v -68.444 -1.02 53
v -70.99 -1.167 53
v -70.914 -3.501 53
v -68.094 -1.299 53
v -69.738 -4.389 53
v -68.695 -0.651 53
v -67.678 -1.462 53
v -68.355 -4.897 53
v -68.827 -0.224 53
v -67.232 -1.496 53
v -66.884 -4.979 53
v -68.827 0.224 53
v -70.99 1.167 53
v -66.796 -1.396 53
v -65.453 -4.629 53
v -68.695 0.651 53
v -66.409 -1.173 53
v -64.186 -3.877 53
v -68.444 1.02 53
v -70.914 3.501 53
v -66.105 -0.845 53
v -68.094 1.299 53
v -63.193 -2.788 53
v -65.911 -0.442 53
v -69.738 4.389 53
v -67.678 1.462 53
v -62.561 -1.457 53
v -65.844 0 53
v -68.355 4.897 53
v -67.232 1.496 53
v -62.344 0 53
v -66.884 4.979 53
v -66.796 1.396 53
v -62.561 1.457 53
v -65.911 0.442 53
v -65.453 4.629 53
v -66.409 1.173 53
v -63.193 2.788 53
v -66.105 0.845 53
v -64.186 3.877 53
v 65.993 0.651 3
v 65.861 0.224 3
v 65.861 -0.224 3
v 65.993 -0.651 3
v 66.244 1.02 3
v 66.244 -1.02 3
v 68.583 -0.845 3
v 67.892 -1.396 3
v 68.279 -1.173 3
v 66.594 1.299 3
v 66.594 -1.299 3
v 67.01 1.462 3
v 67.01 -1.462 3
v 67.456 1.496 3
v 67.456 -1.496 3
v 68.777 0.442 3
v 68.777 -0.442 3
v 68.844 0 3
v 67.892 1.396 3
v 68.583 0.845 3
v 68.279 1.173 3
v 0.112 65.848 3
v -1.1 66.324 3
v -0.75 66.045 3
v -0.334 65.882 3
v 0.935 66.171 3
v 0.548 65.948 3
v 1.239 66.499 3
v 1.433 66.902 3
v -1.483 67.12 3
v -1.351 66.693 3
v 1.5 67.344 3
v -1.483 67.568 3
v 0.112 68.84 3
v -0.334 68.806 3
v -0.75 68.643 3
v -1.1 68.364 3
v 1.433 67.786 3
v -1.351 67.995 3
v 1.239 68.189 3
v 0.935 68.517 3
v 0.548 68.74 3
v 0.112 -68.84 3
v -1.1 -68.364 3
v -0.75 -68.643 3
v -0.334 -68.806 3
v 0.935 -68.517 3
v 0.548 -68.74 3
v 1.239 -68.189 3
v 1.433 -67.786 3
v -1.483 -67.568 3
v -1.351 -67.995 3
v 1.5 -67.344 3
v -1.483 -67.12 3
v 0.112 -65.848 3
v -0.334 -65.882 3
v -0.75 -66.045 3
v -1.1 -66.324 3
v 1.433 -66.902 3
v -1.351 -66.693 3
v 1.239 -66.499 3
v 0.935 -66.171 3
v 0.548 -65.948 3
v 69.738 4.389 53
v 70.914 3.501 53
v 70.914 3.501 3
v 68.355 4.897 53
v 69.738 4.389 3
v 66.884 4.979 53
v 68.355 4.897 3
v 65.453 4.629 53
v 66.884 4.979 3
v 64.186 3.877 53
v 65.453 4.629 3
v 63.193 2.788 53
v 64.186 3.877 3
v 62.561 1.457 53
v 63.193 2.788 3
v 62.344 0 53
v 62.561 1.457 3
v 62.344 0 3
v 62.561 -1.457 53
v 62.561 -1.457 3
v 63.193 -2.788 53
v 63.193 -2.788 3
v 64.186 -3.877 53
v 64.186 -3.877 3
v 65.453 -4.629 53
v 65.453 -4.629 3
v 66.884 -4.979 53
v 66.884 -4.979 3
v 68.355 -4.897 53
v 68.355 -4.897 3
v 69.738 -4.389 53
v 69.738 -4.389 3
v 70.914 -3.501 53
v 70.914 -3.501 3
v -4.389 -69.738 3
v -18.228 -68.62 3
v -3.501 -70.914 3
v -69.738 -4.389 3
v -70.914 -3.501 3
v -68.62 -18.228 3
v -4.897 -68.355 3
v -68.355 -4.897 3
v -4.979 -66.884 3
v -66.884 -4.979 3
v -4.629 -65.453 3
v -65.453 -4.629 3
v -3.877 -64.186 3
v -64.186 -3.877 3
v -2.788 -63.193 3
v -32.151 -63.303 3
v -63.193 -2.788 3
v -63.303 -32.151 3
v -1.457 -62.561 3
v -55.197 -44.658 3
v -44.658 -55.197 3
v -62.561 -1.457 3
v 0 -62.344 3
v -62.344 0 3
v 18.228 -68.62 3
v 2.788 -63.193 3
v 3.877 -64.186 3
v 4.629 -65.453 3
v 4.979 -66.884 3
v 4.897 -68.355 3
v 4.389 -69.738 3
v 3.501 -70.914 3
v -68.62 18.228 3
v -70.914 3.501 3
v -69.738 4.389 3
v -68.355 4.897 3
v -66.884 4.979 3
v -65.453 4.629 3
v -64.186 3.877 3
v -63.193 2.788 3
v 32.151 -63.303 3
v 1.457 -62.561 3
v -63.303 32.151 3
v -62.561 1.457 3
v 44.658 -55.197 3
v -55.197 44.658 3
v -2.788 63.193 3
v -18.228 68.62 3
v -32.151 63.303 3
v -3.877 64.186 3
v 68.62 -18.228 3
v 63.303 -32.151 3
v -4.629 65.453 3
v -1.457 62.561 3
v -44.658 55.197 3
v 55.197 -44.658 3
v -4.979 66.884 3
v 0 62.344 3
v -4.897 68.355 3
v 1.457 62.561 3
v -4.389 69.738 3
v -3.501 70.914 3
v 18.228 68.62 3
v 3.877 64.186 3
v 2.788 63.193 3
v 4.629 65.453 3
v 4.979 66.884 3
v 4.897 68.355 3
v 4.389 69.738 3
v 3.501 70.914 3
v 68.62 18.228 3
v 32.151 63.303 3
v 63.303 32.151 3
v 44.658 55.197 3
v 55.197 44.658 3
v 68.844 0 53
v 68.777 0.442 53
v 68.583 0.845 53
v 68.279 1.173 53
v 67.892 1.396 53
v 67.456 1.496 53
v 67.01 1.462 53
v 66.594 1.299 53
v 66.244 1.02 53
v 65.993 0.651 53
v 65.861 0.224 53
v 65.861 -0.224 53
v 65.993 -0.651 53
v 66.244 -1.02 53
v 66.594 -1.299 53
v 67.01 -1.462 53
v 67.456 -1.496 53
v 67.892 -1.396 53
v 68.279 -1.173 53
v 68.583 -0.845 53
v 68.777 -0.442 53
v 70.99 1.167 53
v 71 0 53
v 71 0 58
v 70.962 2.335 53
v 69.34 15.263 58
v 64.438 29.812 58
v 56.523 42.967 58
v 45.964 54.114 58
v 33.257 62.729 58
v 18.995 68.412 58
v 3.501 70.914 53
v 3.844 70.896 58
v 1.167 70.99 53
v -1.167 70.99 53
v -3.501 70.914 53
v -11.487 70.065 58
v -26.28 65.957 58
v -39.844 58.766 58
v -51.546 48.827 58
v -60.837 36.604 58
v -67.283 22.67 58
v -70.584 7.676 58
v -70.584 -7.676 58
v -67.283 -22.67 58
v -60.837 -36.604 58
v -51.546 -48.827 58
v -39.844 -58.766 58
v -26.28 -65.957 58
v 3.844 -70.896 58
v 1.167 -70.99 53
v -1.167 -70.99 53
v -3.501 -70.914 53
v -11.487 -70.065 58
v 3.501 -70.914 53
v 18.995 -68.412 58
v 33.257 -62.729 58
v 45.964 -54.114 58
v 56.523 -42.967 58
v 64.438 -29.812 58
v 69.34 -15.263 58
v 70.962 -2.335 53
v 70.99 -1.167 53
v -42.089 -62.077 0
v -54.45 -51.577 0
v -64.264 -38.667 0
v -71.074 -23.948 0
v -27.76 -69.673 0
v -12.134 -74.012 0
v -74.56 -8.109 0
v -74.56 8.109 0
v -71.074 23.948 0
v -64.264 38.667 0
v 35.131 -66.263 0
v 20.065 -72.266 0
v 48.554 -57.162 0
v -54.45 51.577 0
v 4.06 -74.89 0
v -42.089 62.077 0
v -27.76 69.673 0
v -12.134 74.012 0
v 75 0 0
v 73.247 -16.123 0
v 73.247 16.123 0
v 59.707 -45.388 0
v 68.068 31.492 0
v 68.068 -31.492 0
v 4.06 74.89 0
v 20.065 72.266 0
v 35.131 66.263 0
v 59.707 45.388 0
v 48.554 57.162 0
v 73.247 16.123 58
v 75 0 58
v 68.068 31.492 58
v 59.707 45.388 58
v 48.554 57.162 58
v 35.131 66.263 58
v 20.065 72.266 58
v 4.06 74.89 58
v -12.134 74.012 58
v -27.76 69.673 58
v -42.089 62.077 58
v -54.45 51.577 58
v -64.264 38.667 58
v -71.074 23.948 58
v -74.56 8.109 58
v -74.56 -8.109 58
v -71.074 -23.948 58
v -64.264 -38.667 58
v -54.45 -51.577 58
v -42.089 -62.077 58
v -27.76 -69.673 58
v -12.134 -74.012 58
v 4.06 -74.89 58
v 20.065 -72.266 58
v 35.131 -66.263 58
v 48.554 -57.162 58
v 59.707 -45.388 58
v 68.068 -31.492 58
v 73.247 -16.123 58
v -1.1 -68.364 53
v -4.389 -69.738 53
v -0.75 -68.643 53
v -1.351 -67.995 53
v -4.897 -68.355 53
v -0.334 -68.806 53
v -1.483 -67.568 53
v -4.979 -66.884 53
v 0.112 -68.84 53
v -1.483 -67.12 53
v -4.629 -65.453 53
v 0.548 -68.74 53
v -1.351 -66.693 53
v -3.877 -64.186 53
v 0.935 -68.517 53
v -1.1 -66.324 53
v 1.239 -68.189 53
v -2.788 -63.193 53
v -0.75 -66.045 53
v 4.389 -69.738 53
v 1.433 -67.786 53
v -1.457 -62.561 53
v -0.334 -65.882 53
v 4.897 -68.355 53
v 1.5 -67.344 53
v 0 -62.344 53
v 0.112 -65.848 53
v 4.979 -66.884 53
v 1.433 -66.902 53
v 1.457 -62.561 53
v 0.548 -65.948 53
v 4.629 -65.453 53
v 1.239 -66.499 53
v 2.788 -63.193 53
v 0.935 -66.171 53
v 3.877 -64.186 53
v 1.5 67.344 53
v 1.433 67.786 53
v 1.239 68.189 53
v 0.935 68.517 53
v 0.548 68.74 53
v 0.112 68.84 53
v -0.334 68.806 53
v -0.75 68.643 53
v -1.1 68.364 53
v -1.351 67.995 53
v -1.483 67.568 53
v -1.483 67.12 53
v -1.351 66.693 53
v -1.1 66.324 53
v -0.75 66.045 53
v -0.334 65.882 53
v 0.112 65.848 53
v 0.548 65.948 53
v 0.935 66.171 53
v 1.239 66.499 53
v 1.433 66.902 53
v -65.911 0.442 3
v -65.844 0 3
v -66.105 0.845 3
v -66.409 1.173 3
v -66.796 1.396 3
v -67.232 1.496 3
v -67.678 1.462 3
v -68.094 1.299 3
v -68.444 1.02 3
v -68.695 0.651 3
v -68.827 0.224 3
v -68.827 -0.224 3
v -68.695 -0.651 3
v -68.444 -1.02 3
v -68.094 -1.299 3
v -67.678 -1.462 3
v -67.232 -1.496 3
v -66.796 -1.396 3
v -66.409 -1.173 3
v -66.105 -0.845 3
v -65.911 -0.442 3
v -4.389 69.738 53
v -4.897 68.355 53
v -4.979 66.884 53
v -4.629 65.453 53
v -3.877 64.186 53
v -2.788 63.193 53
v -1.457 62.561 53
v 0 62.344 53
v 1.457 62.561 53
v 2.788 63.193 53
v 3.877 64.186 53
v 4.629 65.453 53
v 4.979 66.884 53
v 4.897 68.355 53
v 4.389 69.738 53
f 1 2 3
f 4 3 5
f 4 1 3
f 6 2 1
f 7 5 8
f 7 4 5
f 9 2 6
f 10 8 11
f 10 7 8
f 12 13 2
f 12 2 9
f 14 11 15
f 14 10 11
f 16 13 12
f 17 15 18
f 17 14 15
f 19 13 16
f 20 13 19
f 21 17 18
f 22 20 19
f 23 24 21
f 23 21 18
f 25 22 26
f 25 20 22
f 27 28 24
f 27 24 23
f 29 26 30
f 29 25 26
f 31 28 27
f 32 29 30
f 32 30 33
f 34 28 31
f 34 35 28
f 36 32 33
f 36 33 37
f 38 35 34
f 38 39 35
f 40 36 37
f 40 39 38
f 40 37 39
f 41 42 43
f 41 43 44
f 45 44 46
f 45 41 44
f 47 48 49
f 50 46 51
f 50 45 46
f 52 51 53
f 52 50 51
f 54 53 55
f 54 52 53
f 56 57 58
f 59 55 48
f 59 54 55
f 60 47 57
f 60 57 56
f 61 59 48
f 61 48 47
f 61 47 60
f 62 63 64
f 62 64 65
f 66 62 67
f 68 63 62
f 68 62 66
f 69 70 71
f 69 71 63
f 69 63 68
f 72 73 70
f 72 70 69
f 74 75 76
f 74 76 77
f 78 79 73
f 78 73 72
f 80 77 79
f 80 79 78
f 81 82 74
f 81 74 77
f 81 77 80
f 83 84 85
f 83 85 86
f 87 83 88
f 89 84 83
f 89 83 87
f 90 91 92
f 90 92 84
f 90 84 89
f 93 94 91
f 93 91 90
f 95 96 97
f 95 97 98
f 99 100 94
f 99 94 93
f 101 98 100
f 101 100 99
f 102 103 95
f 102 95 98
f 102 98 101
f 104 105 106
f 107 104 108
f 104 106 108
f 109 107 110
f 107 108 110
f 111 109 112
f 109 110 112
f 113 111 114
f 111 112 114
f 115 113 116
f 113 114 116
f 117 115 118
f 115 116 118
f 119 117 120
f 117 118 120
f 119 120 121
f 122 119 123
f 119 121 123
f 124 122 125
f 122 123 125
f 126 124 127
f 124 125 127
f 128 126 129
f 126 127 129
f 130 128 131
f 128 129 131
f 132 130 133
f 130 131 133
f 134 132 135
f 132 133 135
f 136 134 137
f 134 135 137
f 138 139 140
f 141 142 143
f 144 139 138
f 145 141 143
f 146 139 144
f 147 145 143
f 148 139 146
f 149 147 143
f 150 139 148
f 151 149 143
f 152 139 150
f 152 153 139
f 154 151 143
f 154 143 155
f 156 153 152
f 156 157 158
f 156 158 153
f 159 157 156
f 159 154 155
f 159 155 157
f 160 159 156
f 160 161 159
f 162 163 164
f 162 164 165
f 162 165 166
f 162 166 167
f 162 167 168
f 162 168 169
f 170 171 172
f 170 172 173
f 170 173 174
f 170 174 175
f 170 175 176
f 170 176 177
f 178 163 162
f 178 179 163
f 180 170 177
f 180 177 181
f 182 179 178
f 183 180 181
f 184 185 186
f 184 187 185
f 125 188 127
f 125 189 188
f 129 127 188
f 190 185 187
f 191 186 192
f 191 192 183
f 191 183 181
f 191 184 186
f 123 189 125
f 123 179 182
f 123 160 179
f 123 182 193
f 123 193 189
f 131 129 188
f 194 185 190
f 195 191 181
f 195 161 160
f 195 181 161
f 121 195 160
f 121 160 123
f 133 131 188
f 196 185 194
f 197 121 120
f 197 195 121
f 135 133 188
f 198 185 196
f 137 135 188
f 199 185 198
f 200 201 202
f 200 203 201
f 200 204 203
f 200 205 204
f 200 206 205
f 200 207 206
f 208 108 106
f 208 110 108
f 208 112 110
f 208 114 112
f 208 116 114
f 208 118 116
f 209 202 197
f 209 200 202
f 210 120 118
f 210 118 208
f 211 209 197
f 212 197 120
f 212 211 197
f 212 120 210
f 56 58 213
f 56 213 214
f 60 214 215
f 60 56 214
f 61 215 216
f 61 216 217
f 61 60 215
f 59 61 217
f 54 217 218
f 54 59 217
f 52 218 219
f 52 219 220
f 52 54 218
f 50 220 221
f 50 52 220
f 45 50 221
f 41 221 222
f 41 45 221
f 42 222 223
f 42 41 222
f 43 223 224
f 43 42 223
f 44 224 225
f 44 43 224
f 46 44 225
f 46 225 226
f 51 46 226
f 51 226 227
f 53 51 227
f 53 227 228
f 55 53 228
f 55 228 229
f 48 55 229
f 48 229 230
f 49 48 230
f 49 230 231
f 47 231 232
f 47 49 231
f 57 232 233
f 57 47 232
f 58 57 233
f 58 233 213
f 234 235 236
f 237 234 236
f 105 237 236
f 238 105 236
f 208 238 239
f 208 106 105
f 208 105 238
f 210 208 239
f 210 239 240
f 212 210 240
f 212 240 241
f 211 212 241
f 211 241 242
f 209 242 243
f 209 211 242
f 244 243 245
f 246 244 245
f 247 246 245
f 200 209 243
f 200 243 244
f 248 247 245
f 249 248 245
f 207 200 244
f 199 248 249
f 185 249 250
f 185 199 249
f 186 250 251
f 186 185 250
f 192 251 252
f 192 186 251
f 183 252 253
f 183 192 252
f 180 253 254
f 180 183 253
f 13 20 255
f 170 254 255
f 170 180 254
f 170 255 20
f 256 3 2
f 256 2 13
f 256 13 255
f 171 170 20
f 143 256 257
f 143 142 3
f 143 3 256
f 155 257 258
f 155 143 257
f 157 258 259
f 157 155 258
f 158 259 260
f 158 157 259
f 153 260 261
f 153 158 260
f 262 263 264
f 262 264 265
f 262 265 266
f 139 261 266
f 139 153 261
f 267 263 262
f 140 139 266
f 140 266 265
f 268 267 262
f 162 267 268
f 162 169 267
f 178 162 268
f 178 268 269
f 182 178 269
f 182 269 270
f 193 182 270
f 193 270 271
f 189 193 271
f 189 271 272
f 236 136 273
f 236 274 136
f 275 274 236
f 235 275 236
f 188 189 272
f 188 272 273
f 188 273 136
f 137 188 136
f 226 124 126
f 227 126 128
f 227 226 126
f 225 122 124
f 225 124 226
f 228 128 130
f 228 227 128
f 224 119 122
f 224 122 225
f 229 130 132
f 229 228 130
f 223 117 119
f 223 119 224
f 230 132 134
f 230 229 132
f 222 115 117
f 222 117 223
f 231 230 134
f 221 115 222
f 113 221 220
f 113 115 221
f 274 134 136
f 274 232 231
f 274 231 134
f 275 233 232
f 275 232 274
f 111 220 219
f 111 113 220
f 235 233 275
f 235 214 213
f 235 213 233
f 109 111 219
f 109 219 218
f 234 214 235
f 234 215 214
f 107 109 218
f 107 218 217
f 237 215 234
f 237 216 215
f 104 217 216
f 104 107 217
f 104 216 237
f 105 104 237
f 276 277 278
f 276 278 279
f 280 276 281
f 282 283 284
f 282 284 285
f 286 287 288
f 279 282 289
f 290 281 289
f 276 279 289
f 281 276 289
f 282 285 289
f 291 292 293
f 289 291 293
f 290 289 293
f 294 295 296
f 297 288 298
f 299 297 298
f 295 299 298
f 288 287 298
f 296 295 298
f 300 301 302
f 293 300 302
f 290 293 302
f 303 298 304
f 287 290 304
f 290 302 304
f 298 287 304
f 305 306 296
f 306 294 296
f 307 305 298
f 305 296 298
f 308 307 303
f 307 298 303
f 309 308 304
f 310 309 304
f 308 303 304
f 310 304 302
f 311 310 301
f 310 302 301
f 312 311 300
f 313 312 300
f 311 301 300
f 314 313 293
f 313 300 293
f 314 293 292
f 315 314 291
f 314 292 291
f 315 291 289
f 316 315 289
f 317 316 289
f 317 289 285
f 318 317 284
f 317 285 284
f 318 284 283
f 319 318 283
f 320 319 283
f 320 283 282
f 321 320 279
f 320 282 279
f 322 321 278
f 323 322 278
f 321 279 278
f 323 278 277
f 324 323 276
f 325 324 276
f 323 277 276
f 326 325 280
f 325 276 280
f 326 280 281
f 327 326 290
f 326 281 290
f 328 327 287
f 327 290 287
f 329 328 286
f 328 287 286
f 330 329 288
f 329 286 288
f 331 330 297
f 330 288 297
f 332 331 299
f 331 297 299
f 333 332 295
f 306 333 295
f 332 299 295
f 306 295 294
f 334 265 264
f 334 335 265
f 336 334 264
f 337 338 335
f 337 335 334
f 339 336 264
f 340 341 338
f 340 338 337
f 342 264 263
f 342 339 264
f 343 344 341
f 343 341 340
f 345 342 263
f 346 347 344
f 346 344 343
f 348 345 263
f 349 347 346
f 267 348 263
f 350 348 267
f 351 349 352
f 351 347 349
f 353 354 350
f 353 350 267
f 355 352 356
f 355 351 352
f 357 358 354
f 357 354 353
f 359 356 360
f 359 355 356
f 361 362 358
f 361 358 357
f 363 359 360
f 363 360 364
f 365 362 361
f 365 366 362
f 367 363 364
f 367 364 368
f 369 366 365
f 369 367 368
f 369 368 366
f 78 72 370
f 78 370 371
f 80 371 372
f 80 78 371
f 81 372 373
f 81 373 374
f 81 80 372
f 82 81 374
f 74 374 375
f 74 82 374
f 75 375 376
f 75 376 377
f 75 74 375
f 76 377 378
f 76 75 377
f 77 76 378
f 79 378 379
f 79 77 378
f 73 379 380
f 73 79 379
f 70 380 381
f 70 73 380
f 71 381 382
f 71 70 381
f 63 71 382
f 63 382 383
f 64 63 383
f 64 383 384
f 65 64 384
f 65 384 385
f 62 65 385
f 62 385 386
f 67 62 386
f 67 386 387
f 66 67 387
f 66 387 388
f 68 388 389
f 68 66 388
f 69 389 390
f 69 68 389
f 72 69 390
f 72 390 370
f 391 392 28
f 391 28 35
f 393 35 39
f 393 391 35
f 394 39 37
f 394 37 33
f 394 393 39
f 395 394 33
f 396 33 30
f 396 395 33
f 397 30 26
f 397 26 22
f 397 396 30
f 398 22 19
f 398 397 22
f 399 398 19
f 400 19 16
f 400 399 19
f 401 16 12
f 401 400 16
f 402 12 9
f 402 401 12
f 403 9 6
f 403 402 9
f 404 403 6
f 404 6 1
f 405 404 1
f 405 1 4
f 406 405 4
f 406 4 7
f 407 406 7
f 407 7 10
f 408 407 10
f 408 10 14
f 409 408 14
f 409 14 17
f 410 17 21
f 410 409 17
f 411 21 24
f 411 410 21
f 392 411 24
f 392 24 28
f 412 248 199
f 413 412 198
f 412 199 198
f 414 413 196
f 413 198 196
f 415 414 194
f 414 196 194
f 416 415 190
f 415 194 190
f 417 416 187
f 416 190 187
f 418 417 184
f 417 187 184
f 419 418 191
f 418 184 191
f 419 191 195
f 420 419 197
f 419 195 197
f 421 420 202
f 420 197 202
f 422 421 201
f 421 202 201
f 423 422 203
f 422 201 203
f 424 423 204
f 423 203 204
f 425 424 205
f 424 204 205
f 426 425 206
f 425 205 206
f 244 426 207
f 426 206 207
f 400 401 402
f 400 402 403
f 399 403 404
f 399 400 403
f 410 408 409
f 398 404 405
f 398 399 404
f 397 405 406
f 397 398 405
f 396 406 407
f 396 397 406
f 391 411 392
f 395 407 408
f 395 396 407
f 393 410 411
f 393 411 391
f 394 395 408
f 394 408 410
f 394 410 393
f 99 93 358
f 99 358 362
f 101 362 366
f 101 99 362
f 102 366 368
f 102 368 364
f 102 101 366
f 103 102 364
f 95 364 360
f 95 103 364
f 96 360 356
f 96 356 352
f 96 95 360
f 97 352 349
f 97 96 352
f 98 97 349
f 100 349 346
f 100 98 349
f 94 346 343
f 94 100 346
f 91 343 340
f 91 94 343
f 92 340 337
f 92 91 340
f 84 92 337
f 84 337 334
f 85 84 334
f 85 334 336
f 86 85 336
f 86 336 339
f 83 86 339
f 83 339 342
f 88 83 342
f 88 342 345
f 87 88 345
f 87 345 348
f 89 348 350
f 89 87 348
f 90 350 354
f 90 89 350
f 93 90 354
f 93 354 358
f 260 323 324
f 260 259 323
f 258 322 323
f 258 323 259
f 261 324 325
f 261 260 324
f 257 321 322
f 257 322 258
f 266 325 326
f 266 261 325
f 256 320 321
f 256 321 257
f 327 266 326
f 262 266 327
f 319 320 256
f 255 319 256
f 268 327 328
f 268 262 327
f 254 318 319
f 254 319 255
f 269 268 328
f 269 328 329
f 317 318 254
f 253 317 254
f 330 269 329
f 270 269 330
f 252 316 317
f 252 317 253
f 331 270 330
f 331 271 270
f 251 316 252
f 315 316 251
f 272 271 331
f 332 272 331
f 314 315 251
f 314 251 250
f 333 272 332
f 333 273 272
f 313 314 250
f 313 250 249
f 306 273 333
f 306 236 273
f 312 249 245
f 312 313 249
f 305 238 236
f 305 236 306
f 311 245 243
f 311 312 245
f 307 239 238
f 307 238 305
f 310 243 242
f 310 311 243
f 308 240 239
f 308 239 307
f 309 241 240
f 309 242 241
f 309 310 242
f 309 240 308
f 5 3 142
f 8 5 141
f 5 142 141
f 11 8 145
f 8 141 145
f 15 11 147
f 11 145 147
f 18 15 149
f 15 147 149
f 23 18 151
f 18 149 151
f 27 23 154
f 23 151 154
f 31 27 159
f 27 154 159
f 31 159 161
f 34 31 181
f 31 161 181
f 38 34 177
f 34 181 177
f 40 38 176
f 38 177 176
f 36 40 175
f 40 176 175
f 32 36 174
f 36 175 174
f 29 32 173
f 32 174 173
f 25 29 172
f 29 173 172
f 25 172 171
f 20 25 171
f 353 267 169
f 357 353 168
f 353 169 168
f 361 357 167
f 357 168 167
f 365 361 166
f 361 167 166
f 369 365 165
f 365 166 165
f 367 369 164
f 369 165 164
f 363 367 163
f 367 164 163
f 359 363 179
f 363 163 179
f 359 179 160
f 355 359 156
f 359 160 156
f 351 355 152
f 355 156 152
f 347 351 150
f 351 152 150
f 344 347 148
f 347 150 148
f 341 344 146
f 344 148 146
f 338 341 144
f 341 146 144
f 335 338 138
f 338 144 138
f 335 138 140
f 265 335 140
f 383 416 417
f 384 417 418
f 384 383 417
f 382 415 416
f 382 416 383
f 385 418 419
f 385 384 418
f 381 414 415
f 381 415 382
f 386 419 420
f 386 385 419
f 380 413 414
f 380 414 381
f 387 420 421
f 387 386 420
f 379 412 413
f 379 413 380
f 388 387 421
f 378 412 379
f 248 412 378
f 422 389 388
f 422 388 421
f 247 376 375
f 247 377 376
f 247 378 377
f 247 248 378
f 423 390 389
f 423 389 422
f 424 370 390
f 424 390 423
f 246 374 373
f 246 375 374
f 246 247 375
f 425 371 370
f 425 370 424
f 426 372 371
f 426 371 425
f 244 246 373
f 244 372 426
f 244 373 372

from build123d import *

# Parameters (mm, degrees)
F0_R     = 75
F1_DEPTH = 3
F2_R     = 75
F2_R_2   = 71
F3_DEPTH = 55
F4_R     = 5
F4_R_2   = 1.5
F5_DEPTH = 50


with BuildPart() as f1:
    # F0 (on Top) → F1 (new body)
    with BuildSketch(Plane.XY):
        Circle(F0_R)
    extrude(amount=F1_DEPTH)

    # F2 (on face) → F3 (join)
    with BuildSketch(Plane.XY.offset(3)):
        Circle(F2_R)
        Circle(F2_R_2, mode=Mode.SUBTRACT)
    extrude(amount=F3_DEPTH)

    # F4 (on face) → F5 (join)
    with BuildSketch(Plane.XY.offset(3)):
        with Locations((0, 67.343959)):
            Circle(F4_R)
        with Locations((0, 67.343959)):
            Circle(F4_R_2, mode=Mode.SUBTRACT)
        with Locations((-67.343959, 0)):
            Circle(F4_R)
        with Locations((-67.343959, 0)):
            Circle(F4_R_2, mode=Mode.SUBTRACT)
        with Locations((0, -67.343959)):
            Circle(F4_R)
        with Locations((0, -67.343959)):
            Circle(F4_R_2, mode=Mode.SUBTRACT)
        with Locations((67.343959, 0)):
            Circle(F4_R)
        with Locations((67.343959, 0)):
            Circle(F4_R_2, mode=Mode.SUBTRACT)
    extrude(amount=F5_DEPTH)


solid = f1.part
